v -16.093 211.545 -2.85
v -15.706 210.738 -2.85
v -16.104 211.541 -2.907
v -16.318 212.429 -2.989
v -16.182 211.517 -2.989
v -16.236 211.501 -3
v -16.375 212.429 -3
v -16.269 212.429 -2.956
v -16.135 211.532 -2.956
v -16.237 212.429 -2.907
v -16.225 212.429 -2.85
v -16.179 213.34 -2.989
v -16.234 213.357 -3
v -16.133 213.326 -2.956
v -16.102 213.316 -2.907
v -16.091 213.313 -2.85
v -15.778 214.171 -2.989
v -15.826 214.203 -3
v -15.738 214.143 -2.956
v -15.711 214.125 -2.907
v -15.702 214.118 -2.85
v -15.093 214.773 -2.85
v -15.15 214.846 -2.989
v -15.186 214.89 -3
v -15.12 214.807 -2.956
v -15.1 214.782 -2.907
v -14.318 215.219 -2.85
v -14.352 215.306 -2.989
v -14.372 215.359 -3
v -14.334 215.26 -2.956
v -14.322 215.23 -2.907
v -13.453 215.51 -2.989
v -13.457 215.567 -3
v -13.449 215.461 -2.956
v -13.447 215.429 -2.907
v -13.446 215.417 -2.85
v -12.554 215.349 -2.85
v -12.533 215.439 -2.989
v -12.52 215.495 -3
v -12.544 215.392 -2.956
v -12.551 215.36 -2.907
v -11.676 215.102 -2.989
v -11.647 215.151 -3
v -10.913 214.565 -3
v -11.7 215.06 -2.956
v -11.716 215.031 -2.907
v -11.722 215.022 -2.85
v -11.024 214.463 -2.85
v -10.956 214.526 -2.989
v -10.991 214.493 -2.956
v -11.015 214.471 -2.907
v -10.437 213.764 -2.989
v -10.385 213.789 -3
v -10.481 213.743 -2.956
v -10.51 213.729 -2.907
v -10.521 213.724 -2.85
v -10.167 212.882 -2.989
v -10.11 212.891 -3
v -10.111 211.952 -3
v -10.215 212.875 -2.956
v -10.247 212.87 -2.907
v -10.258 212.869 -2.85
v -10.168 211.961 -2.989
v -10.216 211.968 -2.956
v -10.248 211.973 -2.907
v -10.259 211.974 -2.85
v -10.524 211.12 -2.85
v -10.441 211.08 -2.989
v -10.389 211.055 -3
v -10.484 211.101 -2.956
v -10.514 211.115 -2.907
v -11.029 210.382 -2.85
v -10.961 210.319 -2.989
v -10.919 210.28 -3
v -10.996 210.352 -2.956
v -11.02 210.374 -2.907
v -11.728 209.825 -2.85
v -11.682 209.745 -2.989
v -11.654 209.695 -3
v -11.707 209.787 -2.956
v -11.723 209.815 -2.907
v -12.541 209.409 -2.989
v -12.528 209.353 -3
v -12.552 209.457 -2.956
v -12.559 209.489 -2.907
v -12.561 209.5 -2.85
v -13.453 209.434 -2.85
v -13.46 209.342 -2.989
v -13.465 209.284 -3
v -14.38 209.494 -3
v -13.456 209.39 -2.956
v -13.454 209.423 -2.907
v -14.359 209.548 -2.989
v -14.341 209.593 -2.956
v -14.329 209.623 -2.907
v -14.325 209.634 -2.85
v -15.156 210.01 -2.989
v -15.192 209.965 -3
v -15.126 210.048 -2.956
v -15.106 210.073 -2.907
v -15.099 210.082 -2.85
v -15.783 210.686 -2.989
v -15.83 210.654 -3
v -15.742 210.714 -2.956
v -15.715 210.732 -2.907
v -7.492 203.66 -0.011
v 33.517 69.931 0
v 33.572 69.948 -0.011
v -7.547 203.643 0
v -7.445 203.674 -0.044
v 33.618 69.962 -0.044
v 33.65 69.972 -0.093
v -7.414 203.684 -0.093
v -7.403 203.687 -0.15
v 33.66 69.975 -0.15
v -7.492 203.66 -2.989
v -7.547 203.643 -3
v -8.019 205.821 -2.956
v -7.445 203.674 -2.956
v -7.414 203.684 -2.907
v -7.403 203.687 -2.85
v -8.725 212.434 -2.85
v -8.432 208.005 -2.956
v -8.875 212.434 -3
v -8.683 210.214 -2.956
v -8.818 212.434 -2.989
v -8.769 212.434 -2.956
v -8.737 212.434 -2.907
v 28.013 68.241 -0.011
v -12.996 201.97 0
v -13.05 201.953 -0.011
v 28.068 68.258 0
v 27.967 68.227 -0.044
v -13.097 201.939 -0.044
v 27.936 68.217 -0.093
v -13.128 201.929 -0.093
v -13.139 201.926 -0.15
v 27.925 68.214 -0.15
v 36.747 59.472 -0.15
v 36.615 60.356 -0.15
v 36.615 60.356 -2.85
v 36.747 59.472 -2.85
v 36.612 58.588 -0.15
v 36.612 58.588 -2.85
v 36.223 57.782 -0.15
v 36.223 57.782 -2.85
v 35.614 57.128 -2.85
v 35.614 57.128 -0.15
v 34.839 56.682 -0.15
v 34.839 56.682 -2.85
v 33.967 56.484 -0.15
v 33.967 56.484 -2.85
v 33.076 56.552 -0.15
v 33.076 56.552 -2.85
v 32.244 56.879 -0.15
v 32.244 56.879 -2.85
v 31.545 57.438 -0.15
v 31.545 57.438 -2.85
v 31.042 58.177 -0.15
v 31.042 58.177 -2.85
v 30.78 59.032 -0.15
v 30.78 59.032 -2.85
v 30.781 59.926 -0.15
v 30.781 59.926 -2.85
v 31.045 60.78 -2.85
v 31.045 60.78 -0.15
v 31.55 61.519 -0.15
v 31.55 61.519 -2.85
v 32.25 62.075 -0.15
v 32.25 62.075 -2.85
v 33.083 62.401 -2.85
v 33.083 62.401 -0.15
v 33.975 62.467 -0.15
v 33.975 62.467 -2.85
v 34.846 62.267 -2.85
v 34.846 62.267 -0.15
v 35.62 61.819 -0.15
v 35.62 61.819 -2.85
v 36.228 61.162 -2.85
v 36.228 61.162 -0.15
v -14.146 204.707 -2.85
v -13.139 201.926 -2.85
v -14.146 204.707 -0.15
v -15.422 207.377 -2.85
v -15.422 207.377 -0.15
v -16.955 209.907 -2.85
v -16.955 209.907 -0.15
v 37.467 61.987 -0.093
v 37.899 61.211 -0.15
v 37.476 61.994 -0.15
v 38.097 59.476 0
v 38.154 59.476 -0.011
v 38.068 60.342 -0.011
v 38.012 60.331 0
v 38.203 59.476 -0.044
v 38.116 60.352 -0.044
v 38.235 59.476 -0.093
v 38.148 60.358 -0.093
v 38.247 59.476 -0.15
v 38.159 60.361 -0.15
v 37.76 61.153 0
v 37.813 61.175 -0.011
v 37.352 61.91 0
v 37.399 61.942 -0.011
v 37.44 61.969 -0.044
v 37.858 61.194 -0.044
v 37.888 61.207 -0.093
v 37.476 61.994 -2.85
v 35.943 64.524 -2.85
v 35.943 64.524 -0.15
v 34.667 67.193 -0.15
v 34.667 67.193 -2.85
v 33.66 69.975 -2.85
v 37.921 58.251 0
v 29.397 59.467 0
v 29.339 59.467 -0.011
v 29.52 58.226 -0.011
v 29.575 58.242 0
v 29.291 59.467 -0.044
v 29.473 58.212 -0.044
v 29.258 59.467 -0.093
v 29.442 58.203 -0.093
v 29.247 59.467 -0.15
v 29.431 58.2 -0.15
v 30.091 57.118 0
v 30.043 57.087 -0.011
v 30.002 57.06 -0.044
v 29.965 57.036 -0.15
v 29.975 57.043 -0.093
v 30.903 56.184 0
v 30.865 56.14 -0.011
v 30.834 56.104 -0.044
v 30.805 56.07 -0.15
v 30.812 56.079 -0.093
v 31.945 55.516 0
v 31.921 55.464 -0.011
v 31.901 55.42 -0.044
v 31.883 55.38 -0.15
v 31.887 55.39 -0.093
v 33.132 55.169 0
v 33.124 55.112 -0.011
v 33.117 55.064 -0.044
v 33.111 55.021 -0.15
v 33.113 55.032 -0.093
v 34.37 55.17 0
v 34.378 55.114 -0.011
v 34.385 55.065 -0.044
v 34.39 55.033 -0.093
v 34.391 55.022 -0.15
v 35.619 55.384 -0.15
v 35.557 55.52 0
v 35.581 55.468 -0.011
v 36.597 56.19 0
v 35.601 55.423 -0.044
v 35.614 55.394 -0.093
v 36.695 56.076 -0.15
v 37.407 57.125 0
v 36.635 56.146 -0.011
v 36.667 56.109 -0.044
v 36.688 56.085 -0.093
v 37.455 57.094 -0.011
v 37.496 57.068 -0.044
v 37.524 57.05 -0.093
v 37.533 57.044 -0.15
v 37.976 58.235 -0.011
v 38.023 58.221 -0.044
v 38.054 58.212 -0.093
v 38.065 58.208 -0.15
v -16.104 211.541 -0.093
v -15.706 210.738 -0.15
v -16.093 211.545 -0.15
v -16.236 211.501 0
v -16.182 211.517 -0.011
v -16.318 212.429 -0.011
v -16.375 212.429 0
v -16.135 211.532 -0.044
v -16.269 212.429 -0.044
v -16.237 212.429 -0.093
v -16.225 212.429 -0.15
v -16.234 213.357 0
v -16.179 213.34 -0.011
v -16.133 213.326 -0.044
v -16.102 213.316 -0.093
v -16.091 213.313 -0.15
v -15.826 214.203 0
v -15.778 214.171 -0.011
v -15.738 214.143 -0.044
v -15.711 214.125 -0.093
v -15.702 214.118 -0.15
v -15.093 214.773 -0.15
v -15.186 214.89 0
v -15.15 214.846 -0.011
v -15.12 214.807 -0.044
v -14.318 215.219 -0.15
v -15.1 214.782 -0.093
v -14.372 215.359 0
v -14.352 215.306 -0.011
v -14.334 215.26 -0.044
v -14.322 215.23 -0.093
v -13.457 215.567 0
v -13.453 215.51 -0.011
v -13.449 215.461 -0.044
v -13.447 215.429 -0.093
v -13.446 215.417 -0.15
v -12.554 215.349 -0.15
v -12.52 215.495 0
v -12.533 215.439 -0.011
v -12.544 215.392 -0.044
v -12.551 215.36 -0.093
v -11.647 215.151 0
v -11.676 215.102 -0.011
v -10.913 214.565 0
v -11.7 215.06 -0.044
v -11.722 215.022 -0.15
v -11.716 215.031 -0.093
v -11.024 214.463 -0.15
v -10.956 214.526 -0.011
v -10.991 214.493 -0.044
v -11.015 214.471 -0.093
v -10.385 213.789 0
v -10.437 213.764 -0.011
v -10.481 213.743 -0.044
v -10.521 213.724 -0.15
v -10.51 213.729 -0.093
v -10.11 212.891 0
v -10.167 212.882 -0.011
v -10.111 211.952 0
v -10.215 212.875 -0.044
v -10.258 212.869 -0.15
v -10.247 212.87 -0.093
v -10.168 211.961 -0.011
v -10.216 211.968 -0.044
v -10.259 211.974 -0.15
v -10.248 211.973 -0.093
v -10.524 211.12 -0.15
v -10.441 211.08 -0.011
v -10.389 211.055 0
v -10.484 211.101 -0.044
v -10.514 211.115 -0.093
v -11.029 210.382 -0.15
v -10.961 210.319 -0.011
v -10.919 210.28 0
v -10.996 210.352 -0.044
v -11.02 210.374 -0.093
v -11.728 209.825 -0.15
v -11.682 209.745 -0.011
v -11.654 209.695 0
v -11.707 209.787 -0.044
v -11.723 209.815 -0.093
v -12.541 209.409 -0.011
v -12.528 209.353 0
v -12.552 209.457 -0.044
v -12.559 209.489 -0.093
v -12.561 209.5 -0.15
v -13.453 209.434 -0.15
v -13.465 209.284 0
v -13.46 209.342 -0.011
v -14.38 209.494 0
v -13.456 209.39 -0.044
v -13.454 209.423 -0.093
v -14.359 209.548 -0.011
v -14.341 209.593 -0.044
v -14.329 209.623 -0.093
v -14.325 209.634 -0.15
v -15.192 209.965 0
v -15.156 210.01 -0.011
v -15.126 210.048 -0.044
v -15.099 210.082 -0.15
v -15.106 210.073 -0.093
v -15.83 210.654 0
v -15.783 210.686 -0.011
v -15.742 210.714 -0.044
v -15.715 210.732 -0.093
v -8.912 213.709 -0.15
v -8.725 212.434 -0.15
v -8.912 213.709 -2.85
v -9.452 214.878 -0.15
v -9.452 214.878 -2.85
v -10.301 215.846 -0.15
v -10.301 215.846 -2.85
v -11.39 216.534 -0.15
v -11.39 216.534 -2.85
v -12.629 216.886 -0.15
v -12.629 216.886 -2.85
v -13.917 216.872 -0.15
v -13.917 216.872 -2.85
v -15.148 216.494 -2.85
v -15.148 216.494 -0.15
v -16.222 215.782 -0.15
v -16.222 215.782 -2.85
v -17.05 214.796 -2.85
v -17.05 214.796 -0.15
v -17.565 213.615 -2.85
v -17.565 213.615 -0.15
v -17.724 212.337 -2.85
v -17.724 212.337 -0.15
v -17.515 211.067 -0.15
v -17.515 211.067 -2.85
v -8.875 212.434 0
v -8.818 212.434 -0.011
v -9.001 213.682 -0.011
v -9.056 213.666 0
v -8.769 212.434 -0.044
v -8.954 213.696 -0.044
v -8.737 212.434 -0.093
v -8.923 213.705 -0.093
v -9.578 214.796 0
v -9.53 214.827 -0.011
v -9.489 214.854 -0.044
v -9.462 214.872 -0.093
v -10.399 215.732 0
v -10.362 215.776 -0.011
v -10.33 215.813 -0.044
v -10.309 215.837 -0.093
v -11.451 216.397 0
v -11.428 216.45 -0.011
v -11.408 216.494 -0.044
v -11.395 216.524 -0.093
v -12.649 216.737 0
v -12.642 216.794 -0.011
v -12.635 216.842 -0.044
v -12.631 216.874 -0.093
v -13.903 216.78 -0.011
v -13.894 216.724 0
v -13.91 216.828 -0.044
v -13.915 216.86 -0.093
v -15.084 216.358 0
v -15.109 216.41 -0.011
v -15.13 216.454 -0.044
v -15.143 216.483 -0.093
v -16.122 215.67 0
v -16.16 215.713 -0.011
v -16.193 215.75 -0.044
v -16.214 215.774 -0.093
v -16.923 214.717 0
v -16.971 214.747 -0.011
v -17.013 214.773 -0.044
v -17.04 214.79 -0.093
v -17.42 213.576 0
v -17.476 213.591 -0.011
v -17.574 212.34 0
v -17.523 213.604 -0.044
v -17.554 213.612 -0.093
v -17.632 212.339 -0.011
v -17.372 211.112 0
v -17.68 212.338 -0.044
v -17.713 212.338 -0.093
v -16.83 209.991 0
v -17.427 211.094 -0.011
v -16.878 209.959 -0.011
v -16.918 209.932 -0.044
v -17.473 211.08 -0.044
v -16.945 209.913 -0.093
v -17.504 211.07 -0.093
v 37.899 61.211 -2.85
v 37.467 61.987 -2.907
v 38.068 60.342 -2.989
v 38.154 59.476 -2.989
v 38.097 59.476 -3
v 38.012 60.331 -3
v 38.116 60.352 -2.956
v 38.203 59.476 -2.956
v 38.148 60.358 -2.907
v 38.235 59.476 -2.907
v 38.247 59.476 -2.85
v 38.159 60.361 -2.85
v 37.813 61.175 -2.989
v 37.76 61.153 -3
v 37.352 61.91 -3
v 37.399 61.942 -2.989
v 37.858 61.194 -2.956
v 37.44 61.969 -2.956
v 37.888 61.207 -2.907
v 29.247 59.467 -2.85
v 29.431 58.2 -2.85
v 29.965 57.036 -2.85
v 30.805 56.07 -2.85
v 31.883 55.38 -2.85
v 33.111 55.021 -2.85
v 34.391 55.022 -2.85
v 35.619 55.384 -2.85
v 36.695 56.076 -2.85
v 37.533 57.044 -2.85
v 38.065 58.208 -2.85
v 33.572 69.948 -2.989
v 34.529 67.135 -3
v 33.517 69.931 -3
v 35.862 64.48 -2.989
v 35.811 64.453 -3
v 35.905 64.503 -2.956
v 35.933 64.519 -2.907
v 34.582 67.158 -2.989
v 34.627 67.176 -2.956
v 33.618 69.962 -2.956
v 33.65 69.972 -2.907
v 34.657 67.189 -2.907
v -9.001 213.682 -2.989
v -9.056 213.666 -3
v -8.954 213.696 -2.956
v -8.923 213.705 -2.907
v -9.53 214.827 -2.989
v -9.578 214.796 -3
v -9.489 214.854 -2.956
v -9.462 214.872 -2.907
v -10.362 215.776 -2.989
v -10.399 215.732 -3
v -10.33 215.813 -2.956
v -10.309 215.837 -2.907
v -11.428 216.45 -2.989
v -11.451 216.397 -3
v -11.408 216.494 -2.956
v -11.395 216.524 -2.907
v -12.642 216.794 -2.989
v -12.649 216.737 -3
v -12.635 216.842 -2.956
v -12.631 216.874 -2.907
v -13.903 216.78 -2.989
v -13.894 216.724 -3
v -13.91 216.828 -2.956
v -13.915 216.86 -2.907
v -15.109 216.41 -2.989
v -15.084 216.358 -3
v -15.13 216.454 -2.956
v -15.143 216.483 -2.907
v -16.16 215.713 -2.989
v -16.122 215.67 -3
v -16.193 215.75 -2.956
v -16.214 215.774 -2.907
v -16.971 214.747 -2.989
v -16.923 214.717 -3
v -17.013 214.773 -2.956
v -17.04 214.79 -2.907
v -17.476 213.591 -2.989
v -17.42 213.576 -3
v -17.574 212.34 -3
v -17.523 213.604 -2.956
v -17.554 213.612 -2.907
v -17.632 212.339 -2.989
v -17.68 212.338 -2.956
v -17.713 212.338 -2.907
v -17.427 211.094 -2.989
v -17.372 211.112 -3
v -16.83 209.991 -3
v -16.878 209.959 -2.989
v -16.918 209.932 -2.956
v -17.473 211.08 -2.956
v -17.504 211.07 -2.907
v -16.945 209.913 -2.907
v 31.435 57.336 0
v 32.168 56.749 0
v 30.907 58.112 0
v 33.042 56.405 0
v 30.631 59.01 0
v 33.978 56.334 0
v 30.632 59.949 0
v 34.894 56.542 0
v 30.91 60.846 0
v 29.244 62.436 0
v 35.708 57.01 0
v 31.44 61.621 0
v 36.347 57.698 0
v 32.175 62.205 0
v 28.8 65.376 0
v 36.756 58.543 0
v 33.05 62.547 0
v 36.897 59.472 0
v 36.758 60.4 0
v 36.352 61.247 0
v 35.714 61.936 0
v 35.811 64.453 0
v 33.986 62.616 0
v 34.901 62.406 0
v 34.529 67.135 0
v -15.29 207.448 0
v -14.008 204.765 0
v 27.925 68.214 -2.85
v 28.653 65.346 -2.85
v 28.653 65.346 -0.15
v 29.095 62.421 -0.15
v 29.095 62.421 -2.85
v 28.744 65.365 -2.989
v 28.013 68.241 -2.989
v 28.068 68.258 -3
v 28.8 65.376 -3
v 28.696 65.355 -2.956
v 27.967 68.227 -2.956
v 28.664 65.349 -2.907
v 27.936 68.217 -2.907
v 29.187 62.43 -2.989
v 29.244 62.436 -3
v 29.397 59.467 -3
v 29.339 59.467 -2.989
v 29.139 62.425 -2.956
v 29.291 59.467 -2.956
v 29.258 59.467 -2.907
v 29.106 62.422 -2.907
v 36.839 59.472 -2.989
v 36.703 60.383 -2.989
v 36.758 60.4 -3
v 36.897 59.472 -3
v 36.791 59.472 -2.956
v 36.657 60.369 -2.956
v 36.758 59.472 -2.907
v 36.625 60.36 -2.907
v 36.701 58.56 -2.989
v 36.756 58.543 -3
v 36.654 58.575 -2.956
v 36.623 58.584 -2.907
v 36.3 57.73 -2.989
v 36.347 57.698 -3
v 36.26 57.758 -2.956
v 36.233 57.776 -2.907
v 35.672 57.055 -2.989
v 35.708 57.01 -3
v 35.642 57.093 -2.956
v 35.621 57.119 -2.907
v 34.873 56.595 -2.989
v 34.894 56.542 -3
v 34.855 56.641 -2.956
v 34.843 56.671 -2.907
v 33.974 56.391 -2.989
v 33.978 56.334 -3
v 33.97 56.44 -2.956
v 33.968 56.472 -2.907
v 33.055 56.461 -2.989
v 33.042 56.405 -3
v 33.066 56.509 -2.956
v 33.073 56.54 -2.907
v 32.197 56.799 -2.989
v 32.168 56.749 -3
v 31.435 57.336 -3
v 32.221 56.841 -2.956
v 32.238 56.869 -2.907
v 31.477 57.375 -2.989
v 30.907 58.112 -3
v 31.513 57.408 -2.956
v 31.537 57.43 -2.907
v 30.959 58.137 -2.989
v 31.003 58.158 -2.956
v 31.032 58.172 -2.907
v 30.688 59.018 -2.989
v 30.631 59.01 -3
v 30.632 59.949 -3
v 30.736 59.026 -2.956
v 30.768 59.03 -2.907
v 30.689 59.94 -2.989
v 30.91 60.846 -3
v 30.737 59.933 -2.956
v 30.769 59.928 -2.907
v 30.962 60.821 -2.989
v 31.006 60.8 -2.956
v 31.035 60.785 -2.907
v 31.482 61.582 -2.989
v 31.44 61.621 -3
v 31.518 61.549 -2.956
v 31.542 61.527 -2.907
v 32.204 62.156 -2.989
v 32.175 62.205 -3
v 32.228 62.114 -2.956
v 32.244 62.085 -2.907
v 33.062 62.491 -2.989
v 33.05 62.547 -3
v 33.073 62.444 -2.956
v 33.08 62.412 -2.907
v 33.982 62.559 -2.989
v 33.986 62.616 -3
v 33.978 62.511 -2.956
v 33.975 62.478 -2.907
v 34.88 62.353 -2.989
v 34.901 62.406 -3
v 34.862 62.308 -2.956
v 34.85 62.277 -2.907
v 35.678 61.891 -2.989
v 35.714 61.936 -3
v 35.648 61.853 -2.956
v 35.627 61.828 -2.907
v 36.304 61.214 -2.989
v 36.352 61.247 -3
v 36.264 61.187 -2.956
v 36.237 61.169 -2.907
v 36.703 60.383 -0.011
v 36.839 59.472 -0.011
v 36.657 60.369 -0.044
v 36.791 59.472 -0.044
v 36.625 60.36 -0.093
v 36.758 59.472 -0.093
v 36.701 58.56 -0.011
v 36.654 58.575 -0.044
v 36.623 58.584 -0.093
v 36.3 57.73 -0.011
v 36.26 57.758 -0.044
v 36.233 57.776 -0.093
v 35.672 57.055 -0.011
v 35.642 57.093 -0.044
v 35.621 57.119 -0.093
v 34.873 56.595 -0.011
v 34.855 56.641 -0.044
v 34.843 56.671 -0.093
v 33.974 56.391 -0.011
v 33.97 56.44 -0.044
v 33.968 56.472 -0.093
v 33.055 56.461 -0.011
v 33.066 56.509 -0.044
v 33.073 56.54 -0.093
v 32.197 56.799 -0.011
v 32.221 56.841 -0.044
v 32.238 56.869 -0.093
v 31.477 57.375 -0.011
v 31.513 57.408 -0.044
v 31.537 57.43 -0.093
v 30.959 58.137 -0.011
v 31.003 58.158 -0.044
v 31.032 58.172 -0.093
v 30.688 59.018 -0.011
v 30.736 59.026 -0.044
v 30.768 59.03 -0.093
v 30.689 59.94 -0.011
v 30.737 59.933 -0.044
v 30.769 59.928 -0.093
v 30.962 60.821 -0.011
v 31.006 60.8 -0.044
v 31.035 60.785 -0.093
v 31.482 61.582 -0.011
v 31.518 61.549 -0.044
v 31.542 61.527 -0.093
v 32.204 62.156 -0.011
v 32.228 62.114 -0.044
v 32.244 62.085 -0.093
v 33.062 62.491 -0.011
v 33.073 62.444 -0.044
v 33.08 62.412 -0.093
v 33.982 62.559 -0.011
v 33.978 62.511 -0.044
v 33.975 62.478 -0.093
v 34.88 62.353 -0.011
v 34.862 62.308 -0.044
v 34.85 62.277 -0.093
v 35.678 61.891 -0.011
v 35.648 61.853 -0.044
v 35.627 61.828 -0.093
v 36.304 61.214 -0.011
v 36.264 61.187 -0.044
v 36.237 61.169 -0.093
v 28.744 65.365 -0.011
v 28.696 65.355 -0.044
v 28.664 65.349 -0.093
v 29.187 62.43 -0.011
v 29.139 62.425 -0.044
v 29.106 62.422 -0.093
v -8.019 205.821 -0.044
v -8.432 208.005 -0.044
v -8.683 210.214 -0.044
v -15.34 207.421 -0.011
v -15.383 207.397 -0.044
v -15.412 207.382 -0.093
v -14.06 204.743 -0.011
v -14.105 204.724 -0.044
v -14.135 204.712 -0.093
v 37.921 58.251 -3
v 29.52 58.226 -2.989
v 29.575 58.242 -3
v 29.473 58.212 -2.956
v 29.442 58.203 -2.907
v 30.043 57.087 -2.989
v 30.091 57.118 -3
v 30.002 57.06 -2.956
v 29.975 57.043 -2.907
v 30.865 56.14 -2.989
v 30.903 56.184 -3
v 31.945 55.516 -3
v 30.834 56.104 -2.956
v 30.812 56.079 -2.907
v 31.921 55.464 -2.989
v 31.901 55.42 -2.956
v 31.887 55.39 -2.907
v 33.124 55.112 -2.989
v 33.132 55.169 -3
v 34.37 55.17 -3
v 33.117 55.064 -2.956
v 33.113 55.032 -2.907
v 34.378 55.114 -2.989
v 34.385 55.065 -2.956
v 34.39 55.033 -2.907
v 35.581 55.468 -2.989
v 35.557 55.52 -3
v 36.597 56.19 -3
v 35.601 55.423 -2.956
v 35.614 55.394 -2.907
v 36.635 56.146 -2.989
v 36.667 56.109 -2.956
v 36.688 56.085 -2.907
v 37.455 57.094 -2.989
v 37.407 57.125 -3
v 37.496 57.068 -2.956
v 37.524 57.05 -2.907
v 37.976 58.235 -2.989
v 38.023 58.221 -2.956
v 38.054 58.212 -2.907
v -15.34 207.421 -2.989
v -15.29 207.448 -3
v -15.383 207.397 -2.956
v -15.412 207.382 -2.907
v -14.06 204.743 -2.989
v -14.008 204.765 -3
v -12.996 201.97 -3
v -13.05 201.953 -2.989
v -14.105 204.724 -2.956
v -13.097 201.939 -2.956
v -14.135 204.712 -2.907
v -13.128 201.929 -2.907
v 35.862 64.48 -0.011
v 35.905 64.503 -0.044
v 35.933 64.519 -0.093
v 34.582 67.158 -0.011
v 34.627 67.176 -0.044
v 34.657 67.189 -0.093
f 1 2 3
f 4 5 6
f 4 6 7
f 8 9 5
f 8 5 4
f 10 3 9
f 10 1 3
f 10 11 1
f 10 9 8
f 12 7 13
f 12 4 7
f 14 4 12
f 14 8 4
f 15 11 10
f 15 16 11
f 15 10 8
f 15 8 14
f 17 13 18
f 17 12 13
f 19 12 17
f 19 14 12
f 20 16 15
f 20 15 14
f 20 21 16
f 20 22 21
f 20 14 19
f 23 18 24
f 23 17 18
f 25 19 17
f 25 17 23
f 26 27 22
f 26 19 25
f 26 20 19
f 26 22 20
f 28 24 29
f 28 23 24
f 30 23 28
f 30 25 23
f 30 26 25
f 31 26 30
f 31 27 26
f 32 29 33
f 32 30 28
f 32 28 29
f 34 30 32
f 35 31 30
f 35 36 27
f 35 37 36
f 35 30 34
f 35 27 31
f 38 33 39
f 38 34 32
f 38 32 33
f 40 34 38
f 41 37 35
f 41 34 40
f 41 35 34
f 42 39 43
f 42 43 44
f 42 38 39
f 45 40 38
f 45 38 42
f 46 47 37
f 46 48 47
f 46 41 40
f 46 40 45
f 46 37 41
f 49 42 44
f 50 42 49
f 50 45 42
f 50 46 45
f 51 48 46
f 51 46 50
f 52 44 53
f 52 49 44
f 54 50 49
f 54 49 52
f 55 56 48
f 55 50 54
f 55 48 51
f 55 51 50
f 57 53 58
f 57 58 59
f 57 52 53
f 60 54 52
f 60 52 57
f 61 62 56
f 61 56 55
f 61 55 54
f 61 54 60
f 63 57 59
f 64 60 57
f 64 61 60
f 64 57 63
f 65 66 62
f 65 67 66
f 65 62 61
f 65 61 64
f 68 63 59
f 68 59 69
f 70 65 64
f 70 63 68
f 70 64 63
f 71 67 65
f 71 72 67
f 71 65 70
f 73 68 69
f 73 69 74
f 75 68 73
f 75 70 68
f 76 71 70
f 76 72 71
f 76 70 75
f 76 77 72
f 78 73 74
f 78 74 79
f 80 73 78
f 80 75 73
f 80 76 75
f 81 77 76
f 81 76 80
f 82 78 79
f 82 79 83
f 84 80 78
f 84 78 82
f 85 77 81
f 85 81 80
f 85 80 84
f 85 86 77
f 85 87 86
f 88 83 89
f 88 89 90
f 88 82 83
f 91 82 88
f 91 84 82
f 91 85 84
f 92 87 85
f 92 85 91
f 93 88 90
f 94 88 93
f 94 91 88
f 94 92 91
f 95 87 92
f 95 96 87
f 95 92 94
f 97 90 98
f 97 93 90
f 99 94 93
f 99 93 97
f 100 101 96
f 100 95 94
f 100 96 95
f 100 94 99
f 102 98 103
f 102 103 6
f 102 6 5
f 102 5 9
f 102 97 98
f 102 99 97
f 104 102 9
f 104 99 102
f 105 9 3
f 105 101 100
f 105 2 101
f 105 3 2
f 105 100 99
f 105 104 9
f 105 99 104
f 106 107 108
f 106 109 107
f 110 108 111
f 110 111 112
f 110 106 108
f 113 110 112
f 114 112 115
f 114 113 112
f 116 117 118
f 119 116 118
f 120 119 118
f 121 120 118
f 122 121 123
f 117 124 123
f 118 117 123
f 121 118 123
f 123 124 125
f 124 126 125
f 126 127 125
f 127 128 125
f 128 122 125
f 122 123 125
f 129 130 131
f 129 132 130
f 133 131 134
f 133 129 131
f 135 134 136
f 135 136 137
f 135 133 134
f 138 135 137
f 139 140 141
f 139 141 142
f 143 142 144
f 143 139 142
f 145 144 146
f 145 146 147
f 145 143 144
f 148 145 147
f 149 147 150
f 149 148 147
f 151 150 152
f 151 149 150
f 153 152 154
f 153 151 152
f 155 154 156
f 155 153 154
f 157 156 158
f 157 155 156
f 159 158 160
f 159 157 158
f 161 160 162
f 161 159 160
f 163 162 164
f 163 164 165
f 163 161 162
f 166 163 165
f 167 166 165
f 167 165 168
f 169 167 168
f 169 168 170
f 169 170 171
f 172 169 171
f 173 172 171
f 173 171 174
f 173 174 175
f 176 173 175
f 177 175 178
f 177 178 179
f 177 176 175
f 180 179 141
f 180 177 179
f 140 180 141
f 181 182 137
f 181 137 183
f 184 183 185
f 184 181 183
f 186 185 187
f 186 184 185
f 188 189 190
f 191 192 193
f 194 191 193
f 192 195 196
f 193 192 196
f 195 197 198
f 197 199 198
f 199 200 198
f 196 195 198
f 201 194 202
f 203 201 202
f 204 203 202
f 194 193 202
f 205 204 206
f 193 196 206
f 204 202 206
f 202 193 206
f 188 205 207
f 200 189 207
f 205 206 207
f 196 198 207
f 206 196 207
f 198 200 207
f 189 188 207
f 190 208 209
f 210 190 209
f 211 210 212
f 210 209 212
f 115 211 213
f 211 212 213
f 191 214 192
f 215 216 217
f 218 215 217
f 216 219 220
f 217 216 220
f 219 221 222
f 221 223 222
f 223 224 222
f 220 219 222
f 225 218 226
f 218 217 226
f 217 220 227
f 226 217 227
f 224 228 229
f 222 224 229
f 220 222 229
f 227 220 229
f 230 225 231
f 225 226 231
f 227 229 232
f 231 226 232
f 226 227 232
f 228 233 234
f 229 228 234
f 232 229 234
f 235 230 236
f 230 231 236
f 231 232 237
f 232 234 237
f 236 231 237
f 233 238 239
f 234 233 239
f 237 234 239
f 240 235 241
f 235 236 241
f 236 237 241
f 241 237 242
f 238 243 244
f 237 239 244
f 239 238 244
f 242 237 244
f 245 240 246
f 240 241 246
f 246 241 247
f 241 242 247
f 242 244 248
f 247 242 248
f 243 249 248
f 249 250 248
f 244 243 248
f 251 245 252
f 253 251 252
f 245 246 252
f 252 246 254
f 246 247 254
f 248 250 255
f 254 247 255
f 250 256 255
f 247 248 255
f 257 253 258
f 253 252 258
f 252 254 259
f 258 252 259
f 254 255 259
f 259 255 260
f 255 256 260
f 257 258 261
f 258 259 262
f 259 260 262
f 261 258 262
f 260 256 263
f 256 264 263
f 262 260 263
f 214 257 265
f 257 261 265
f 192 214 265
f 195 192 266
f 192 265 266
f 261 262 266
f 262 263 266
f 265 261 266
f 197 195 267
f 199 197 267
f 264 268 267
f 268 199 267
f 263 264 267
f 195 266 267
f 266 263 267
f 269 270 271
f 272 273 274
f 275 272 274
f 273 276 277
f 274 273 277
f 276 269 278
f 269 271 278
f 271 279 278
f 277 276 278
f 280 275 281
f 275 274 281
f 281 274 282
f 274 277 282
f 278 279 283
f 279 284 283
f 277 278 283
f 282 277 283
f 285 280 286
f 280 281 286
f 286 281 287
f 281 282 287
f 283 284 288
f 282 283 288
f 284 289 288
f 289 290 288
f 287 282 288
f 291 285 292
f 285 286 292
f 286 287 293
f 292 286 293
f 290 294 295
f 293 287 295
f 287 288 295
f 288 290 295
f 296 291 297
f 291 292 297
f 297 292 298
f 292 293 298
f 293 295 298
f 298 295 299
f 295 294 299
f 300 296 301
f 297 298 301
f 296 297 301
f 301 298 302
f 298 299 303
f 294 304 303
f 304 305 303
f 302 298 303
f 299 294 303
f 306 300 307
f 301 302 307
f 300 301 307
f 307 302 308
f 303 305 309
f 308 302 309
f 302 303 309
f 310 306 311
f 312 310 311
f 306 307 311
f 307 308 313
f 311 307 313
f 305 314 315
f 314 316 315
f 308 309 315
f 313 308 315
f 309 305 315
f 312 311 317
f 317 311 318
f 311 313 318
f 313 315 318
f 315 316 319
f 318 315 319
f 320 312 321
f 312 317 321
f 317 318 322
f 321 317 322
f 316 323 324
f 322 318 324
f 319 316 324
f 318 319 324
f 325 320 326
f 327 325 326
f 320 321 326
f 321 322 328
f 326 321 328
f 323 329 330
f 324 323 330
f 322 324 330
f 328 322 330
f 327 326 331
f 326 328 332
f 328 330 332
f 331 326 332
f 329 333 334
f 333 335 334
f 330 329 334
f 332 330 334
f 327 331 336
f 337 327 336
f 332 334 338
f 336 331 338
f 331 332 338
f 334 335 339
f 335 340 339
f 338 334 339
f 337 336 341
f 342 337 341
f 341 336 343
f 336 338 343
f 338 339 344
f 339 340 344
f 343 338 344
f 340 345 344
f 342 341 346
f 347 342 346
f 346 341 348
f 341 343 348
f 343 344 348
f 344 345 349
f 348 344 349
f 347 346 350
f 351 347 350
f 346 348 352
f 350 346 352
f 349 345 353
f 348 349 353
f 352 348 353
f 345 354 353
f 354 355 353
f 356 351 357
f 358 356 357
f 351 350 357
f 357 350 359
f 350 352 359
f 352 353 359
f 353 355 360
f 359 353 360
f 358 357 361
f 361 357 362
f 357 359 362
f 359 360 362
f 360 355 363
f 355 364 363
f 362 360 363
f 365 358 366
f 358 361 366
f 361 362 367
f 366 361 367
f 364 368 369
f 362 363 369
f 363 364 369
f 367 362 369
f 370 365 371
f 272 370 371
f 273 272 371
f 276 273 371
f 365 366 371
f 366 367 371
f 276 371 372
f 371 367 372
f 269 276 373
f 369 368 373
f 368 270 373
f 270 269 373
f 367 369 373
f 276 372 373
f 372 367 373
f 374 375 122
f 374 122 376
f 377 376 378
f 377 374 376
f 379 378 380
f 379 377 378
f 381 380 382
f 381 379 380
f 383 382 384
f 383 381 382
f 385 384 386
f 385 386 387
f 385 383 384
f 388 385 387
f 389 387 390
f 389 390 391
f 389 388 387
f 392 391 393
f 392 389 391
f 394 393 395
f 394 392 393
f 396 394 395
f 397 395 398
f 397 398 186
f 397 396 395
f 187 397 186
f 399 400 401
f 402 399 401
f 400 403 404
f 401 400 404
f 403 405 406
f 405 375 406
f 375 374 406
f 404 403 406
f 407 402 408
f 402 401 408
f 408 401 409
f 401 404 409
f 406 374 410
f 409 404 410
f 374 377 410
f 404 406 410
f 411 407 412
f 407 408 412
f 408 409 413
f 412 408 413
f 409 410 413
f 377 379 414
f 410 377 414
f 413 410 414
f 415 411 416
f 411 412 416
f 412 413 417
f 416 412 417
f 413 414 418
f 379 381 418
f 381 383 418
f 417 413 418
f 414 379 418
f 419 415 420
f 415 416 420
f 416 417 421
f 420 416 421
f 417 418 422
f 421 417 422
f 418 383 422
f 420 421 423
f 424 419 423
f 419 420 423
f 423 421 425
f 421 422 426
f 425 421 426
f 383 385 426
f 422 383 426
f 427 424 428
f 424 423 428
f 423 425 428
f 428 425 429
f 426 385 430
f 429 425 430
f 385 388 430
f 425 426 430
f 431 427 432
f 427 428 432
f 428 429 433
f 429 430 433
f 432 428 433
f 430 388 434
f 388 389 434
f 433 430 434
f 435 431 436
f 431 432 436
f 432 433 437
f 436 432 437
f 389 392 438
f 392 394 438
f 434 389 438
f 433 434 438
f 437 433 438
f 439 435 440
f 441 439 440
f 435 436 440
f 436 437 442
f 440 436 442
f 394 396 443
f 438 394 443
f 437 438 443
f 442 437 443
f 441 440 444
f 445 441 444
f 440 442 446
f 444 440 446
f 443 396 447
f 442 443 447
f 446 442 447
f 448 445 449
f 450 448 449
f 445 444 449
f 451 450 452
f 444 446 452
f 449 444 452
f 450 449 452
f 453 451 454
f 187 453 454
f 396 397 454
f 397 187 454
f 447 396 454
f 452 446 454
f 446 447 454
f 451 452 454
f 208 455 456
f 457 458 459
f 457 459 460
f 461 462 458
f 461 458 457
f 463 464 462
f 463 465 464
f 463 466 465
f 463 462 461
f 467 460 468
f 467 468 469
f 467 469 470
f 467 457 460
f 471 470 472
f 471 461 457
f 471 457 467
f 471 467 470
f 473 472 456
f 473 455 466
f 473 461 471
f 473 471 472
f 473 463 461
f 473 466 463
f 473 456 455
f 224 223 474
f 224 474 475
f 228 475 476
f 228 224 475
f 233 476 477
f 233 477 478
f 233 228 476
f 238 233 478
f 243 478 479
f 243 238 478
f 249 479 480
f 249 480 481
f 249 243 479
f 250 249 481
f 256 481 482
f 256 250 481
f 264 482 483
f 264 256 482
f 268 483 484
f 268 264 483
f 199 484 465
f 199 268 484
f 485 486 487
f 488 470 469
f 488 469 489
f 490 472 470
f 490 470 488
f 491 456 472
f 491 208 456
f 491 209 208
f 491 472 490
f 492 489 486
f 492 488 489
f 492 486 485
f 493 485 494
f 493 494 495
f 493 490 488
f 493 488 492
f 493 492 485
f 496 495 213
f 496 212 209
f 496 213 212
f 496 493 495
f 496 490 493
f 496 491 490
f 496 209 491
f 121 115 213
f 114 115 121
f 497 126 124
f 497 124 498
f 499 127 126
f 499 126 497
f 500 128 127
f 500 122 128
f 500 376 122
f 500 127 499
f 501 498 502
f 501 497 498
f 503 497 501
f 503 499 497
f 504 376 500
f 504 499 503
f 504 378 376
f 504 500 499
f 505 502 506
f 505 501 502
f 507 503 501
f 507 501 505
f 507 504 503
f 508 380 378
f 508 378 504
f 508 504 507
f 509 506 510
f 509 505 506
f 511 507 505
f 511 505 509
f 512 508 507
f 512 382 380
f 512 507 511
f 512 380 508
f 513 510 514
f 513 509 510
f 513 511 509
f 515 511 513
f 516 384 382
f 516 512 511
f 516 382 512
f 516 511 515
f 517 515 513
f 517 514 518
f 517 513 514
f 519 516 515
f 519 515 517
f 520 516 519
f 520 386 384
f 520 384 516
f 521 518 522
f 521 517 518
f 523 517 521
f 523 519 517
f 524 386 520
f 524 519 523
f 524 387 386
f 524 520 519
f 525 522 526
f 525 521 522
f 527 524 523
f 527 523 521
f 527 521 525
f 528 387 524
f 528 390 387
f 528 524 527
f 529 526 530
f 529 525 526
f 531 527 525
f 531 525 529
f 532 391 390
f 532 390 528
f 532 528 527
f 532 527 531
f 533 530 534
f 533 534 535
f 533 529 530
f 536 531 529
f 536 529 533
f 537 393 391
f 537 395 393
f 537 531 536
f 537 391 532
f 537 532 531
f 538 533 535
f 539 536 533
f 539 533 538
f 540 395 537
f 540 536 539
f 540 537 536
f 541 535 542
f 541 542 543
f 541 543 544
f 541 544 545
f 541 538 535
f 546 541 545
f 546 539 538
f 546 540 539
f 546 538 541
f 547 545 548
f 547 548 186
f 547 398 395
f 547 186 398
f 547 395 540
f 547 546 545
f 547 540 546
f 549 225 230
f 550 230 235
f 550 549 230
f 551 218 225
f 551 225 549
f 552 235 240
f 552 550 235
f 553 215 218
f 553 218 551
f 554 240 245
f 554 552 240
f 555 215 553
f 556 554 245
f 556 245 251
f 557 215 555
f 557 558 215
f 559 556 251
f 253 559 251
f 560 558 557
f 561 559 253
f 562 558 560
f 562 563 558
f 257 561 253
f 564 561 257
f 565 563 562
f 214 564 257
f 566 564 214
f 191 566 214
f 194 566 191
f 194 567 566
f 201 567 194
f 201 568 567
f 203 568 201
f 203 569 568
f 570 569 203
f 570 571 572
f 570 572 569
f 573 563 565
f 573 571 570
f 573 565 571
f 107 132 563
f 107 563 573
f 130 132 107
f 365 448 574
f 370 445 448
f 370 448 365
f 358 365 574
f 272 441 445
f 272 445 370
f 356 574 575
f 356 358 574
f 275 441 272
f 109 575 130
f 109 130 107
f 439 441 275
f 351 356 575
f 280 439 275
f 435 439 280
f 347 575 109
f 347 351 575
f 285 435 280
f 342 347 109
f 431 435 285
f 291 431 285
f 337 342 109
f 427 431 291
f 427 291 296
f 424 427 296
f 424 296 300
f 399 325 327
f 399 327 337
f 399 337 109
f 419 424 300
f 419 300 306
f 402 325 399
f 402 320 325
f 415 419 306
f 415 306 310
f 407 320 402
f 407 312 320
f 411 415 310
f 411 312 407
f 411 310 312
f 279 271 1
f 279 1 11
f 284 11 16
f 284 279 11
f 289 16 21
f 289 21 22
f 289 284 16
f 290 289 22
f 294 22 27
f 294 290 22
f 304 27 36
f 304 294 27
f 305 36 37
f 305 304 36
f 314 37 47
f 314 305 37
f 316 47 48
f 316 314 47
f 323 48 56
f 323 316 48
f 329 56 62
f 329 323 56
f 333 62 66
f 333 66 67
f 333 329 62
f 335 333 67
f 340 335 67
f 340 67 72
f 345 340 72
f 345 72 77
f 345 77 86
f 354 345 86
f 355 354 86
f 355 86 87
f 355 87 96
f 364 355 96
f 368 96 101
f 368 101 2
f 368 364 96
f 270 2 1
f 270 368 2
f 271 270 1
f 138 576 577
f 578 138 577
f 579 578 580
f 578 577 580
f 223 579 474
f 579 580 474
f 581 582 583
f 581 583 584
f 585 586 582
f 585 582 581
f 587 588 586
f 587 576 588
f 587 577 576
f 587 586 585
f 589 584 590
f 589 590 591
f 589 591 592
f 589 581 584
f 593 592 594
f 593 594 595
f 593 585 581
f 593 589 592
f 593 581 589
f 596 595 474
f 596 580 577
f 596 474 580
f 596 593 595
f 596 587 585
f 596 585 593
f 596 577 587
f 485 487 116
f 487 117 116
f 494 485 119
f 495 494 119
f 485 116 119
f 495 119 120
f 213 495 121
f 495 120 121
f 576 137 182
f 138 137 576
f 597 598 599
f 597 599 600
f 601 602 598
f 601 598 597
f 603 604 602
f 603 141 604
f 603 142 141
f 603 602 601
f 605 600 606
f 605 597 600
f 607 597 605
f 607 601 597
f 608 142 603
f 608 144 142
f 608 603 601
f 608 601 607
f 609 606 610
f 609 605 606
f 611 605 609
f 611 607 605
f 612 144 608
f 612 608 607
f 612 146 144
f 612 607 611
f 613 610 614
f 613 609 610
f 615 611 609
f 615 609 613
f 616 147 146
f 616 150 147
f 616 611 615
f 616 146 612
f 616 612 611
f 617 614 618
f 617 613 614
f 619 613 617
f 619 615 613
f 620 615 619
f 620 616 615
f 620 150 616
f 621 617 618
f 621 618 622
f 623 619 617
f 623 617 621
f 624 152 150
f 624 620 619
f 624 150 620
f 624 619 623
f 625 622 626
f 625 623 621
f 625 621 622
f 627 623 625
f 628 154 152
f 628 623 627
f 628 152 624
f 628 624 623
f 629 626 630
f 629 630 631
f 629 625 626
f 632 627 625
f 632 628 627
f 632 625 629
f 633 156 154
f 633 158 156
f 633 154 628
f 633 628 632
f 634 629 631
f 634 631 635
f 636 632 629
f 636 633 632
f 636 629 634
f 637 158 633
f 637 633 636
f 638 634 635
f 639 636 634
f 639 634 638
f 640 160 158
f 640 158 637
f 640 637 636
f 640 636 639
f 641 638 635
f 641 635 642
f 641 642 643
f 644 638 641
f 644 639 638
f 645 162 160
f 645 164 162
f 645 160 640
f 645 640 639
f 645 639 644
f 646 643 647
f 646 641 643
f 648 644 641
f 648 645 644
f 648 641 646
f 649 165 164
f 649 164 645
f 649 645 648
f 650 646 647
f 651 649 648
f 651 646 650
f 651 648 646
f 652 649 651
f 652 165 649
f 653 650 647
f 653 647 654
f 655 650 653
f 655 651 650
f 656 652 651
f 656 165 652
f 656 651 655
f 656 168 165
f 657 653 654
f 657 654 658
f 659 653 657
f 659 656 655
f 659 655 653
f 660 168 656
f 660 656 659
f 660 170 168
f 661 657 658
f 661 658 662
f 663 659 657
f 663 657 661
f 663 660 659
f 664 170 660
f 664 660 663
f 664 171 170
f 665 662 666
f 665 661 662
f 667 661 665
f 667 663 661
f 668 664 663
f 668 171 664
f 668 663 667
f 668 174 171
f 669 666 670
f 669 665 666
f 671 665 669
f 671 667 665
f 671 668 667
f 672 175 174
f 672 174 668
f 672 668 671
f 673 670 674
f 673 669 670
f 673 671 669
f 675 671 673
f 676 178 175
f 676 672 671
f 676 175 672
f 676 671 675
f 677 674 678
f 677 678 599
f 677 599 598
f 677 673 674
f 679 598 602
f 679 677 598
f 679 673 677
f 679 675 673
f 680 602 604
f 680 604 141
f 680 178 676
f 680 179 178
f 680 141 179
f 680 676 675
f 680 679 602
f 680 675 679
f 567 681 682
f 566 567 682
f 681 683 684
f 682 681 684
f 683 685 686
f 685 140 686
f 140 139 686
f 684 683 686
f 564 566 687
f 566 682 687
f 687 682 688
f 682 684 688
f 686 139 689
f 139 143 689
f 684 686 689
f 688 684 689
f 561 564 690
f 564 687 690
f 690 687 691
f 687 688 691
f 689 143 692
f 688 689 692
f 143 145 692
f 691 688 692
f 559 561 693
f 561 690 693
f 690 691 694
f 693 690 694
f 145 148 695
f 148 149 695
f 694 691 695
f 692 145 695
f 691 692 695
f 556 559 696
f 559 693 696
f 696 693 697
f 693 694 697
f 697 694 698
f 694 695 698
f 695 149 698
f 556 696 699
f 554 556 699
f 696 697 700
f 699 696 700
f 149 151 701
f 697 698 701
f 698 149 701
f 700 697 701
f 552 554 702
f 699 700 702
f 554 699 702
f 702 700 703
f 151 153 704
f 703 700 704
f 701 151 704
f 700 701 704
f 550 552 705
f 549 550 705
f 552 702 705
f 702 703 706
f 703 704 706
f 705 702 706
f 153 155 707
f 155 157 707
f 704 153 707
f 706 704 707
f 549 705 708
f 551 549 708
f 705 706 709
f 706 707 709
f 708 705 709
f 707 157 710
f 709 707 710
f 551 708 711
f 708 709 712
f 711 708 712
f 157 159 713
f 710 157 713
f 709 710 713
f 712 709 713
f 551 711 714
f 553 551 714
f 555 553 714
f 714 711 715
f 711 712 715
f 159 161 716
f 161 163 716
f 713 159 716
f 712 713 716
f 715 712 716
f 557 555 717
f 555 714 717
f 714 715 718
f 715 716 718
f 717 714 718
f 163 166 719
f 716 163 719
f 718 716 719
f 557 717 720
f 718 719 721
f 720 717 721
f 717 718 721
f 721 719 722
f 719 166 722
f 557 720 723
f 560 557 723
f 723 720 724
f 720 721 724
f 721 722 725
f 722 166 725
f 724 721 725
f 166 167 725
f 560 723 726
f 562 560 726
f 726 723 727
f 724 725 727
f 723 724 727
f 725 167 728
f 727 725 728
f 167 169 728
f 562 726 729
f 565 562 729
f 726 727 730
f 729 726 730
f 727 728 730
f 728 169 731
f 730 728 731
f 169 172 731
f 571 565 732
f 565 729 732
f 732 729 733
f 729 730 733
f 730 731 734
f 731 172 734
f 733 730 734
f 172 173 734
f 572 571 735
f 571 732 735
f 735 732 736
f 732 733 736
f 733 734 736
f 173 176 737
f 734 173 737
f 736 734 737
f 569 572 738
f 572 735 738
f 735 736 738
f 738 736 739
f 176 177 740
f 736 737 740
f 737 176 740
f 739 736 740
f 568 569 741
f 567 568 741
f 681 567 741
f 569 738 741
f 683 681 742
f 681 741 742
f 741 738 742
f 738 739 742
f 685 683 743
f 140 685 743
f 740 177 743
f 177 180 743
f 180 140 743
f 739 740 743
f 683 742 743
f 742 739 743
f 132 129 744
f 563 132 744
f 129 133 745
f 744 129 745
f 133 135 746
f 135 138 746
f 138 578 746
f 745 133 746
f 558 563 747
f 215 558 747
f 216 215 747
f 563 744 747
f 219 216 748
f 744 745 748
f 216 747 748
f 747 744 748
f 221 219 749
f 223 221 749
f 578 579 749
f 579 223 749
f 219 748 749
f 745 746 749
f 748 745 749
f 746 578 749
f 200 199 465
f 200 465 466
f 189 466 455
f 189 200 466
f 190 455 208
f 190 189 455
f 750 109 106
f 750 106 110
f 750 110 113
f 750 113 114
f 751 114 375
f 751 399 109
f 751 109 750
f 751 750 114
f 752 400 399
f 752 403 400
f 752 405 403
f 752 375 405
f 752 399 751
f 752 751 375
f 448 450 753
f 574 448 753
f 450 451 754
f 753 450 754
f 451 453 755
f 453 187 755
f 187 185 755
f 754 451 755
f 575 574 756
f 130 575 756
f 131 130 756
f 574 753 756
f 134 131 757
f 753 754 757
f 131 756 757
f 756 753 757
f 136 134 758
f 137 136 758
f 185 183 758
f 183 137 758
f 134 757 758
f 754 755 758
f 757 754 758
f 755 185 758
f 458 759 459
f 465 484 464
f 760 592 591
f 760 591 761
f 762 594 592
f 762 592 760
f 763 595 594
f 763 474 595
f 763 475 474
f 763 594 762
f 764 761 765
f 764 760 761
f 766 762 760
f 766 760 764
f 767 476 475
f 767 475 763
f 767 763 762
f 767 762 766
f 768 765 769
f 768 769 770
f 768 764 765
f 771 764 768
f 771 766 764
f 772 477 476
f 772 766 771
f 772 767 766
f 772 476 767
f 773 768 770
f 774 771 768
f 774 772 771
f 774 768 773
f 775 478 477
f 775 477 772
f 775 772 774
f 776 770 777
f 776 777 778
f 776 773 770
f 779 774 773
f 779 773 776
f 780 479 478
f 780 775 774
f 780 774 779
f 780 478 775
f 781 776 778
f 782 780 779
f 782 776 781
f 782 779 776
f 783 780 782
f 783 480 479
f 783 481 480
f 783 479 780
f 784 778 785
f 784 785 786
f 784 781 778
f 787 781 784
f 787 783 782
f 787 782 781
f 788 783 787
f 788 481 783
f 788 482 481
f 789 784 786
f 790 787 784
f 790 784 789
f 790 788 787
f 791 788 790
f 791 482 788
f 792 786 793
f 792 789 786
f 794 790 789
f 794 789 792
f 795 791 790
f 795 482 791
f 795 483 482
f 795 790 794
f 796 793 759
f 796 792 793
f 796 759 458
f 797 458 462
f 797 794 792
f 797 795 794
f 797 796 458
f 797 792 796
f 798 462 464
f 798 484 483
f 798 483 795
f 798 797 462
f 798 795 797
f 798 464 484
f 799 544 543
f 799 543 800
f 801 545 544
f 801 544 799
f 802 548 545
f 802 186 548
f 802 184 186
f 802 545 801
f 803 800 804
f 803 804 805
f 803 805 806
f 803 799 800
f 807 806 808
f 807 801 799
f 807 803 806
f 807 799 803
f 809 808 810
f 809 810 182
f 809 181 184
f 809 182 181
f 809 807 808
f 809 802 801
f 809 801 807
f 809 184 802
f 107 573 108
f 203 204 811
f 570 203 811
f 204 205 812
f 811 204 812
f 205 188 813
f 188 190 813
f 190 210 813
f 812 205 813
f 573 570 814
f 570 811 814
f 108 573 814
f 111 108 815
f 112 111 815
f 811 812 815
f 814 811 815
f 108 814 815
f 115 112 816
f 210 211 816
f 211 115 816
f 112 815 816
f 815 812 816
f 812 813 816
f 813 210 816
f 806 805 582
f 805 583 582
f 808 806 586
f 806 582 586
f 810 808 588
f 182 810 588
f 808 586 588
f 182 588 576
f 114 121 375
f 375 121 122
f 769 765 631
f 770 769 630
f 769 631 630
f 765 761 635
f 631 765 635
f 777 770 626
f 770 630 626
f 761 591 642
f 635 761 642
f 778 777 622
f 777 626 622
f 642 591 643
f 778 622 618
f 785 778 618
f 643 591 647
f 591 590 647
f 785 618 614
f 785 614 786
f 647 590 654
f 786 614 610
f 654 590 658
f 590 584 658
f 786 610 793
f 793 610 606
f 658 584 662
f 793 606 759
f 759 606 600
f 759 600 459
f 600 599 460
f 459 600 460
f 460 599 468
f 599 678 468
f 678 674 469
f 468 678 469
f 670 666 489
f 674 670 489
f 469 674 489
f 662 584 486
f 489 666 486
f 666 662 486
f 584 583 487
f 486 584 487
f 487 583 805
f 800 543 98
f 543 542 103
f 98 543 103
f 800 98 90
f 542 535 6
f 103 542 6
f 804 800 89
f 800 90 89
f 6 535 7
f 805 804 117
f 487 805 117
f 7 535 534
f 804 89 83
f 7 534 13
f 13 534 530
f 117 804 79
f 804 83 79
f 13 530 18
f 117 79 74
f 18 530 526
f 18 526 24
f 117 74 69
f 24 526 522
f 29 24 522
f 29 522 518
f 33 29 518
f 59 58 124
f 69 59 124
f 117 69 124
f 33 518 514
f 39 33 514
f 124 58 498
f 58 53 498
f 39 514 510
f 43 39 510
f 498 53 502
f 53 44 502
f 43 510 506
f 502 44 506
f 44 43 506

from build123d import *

# Parameters (mm, degrees)
EXTRUDE_1_DEPTH = 3
FILLET_1_R      = 30
FILLET_2_R      = 0.15


with BuildPart() as part:
    # 草图1 → 凸台-拉伸1 (new body)
    with BuildSketch(Plane.XY):
        with BuildLine():
            Line((-15.108353931, 208.338258003), (29.894233953, 61.801089253))
            ThreePointArc((29.894233953, 61.801089253), (32.425635759, 63.777218602), (35.62985083, 63.562537251))
            Line((35.62985083, 63.562537251), (-9.372737055, 210.099706001))
            ThreePointArc((-9.372737055, 210.099706001), (-11.90413886, 208.123576652), (-15.108353931, 208.338258003))
        make_face()
        with BuildLine():
            ThreePointArc((36.614530195, 60.356229944), (34.627445756, 56.607697507), (30.878913319, 58.594781946))
            Line((30.878913319, 58.594781946), (29.894233953, 61.801089253))
            ThreePointArc((29.894233953, 61.801089253), (32.539699619, 55.140405305), (38.246721757, 59.475505945))
            ThreePointArc((38.246721757, 59.475505945), (37.536450034, 61.90201776), (35.62985083, 63.562537251))
            Line((35.62985083, 63.562537251), (36.614530195, 60.356229944))
        make_face()
        with BuildLine():
            ThreePointArc((-8.725224859, 212.425289309), (-15.651736673, 216.215017586), (-15.108353931, 208.338258003))
            Line((-15.108353931, 208.338258003), (-16.093033297, 211.54456531))
            ThreePointArc((-16.093033297, 211.54456531), (-14.105948858, 215.293097747), (-10.357416421, 213.306013308))
            Line((-10.357416421, 213.306013308), (-9.372737055, 210.099706001))
            ThreePointArc((-9.372737055, 210.099706001), (-8.890124219, 211.218267171), (-8.725224859, 212.425289309))
        make_face()
        with BuildLine():
            Line((-16.093033297, 211.54456531), (-15.108353931, 208.338258003))
            ThreePointArc((-15.108353931, 208.338258003), (-11.90413886, 208.123576652), (-9.372737055, 210.099706001))
            Line((-9.372737055, 210.099706001), (-10.357416421, 213.306013308))
            ThreePointArc((-10.357416421, 213.306013308), (-12.34450086, 209.557480871), (-16.093033297, 211.54456531))
        make_face()
        with BuildLine():
            Line((29.894233953, 61.801089253), (30.878913319, 58.594781946))
            ThreePointArc((30.878913319, 58.594781946), (32.865997758, 62.343314383), (36.614530195, 60.356229944))
            Line((36.614530195, 60.356229944), (35.62985083, 63.562537251))
            ThreePointArc((35.62985083, 63.562537251), (32.425635759, 63.777218602), (29.894233953, 61.801089253))
        make_face()
    extrude(amount=-EXTRUDE_1_DEPTH)

    # 圆角1
    fillet_1_edges = [part.edges().sort_by_distance(p)[0] for p in [
        (29.894233953, 61.801089253, -1.5),
        (-15.108353931, 208.338258003, -1.5),
        (-9.372737055, 210.099706001, -1.5),
        (35.62985083, 63.562537251, -1.5),
    ]]
    fillet(fillet_1_edges, radius=FILLET_1_R)

    # 圆角2
    fillet_2_edges = [part.edges().sort_by_distance(p)[0] for p in [
        (-10.357416421, 213.306013308, 0),
        (-14.546310857, 216.727001966, 0),
        (-14.546310857, 216.727001966, -3),
        (7.392940011, 135.069673628, 0),
        (7.392940011, 135.069673628, -3),
        (13.128556887, 136.831121626, 0),
        (13.128556887, 136.831121626, -3),
        (33.751224503, 54.975508198, 0),
        (33.751224503, 54.975508198, -3),
        (-14.750982991, 206.05773937, 0),
        (-14.750982991, 206.05773937, -3),
        (-8.388503918, 208.011701126, 0),
        (30.878913319, 58.594781946, -3),
        (-8.388503918, 208.011701126, -3),
        (35.272479889, 65.843055884, 0),
        (35.272479889, 65.843055884, -3),
        (28.910000817, 63.889094128, 0),
        (28.910000817, 63.889094128, -3),
        (-10.357416421, 213.306013308, -3),
        (30.878913319, 58.594781946, 0),
    ]]
    fillet(fillet_2_edges, radius=FILLET_2_R)


solid = part.part
